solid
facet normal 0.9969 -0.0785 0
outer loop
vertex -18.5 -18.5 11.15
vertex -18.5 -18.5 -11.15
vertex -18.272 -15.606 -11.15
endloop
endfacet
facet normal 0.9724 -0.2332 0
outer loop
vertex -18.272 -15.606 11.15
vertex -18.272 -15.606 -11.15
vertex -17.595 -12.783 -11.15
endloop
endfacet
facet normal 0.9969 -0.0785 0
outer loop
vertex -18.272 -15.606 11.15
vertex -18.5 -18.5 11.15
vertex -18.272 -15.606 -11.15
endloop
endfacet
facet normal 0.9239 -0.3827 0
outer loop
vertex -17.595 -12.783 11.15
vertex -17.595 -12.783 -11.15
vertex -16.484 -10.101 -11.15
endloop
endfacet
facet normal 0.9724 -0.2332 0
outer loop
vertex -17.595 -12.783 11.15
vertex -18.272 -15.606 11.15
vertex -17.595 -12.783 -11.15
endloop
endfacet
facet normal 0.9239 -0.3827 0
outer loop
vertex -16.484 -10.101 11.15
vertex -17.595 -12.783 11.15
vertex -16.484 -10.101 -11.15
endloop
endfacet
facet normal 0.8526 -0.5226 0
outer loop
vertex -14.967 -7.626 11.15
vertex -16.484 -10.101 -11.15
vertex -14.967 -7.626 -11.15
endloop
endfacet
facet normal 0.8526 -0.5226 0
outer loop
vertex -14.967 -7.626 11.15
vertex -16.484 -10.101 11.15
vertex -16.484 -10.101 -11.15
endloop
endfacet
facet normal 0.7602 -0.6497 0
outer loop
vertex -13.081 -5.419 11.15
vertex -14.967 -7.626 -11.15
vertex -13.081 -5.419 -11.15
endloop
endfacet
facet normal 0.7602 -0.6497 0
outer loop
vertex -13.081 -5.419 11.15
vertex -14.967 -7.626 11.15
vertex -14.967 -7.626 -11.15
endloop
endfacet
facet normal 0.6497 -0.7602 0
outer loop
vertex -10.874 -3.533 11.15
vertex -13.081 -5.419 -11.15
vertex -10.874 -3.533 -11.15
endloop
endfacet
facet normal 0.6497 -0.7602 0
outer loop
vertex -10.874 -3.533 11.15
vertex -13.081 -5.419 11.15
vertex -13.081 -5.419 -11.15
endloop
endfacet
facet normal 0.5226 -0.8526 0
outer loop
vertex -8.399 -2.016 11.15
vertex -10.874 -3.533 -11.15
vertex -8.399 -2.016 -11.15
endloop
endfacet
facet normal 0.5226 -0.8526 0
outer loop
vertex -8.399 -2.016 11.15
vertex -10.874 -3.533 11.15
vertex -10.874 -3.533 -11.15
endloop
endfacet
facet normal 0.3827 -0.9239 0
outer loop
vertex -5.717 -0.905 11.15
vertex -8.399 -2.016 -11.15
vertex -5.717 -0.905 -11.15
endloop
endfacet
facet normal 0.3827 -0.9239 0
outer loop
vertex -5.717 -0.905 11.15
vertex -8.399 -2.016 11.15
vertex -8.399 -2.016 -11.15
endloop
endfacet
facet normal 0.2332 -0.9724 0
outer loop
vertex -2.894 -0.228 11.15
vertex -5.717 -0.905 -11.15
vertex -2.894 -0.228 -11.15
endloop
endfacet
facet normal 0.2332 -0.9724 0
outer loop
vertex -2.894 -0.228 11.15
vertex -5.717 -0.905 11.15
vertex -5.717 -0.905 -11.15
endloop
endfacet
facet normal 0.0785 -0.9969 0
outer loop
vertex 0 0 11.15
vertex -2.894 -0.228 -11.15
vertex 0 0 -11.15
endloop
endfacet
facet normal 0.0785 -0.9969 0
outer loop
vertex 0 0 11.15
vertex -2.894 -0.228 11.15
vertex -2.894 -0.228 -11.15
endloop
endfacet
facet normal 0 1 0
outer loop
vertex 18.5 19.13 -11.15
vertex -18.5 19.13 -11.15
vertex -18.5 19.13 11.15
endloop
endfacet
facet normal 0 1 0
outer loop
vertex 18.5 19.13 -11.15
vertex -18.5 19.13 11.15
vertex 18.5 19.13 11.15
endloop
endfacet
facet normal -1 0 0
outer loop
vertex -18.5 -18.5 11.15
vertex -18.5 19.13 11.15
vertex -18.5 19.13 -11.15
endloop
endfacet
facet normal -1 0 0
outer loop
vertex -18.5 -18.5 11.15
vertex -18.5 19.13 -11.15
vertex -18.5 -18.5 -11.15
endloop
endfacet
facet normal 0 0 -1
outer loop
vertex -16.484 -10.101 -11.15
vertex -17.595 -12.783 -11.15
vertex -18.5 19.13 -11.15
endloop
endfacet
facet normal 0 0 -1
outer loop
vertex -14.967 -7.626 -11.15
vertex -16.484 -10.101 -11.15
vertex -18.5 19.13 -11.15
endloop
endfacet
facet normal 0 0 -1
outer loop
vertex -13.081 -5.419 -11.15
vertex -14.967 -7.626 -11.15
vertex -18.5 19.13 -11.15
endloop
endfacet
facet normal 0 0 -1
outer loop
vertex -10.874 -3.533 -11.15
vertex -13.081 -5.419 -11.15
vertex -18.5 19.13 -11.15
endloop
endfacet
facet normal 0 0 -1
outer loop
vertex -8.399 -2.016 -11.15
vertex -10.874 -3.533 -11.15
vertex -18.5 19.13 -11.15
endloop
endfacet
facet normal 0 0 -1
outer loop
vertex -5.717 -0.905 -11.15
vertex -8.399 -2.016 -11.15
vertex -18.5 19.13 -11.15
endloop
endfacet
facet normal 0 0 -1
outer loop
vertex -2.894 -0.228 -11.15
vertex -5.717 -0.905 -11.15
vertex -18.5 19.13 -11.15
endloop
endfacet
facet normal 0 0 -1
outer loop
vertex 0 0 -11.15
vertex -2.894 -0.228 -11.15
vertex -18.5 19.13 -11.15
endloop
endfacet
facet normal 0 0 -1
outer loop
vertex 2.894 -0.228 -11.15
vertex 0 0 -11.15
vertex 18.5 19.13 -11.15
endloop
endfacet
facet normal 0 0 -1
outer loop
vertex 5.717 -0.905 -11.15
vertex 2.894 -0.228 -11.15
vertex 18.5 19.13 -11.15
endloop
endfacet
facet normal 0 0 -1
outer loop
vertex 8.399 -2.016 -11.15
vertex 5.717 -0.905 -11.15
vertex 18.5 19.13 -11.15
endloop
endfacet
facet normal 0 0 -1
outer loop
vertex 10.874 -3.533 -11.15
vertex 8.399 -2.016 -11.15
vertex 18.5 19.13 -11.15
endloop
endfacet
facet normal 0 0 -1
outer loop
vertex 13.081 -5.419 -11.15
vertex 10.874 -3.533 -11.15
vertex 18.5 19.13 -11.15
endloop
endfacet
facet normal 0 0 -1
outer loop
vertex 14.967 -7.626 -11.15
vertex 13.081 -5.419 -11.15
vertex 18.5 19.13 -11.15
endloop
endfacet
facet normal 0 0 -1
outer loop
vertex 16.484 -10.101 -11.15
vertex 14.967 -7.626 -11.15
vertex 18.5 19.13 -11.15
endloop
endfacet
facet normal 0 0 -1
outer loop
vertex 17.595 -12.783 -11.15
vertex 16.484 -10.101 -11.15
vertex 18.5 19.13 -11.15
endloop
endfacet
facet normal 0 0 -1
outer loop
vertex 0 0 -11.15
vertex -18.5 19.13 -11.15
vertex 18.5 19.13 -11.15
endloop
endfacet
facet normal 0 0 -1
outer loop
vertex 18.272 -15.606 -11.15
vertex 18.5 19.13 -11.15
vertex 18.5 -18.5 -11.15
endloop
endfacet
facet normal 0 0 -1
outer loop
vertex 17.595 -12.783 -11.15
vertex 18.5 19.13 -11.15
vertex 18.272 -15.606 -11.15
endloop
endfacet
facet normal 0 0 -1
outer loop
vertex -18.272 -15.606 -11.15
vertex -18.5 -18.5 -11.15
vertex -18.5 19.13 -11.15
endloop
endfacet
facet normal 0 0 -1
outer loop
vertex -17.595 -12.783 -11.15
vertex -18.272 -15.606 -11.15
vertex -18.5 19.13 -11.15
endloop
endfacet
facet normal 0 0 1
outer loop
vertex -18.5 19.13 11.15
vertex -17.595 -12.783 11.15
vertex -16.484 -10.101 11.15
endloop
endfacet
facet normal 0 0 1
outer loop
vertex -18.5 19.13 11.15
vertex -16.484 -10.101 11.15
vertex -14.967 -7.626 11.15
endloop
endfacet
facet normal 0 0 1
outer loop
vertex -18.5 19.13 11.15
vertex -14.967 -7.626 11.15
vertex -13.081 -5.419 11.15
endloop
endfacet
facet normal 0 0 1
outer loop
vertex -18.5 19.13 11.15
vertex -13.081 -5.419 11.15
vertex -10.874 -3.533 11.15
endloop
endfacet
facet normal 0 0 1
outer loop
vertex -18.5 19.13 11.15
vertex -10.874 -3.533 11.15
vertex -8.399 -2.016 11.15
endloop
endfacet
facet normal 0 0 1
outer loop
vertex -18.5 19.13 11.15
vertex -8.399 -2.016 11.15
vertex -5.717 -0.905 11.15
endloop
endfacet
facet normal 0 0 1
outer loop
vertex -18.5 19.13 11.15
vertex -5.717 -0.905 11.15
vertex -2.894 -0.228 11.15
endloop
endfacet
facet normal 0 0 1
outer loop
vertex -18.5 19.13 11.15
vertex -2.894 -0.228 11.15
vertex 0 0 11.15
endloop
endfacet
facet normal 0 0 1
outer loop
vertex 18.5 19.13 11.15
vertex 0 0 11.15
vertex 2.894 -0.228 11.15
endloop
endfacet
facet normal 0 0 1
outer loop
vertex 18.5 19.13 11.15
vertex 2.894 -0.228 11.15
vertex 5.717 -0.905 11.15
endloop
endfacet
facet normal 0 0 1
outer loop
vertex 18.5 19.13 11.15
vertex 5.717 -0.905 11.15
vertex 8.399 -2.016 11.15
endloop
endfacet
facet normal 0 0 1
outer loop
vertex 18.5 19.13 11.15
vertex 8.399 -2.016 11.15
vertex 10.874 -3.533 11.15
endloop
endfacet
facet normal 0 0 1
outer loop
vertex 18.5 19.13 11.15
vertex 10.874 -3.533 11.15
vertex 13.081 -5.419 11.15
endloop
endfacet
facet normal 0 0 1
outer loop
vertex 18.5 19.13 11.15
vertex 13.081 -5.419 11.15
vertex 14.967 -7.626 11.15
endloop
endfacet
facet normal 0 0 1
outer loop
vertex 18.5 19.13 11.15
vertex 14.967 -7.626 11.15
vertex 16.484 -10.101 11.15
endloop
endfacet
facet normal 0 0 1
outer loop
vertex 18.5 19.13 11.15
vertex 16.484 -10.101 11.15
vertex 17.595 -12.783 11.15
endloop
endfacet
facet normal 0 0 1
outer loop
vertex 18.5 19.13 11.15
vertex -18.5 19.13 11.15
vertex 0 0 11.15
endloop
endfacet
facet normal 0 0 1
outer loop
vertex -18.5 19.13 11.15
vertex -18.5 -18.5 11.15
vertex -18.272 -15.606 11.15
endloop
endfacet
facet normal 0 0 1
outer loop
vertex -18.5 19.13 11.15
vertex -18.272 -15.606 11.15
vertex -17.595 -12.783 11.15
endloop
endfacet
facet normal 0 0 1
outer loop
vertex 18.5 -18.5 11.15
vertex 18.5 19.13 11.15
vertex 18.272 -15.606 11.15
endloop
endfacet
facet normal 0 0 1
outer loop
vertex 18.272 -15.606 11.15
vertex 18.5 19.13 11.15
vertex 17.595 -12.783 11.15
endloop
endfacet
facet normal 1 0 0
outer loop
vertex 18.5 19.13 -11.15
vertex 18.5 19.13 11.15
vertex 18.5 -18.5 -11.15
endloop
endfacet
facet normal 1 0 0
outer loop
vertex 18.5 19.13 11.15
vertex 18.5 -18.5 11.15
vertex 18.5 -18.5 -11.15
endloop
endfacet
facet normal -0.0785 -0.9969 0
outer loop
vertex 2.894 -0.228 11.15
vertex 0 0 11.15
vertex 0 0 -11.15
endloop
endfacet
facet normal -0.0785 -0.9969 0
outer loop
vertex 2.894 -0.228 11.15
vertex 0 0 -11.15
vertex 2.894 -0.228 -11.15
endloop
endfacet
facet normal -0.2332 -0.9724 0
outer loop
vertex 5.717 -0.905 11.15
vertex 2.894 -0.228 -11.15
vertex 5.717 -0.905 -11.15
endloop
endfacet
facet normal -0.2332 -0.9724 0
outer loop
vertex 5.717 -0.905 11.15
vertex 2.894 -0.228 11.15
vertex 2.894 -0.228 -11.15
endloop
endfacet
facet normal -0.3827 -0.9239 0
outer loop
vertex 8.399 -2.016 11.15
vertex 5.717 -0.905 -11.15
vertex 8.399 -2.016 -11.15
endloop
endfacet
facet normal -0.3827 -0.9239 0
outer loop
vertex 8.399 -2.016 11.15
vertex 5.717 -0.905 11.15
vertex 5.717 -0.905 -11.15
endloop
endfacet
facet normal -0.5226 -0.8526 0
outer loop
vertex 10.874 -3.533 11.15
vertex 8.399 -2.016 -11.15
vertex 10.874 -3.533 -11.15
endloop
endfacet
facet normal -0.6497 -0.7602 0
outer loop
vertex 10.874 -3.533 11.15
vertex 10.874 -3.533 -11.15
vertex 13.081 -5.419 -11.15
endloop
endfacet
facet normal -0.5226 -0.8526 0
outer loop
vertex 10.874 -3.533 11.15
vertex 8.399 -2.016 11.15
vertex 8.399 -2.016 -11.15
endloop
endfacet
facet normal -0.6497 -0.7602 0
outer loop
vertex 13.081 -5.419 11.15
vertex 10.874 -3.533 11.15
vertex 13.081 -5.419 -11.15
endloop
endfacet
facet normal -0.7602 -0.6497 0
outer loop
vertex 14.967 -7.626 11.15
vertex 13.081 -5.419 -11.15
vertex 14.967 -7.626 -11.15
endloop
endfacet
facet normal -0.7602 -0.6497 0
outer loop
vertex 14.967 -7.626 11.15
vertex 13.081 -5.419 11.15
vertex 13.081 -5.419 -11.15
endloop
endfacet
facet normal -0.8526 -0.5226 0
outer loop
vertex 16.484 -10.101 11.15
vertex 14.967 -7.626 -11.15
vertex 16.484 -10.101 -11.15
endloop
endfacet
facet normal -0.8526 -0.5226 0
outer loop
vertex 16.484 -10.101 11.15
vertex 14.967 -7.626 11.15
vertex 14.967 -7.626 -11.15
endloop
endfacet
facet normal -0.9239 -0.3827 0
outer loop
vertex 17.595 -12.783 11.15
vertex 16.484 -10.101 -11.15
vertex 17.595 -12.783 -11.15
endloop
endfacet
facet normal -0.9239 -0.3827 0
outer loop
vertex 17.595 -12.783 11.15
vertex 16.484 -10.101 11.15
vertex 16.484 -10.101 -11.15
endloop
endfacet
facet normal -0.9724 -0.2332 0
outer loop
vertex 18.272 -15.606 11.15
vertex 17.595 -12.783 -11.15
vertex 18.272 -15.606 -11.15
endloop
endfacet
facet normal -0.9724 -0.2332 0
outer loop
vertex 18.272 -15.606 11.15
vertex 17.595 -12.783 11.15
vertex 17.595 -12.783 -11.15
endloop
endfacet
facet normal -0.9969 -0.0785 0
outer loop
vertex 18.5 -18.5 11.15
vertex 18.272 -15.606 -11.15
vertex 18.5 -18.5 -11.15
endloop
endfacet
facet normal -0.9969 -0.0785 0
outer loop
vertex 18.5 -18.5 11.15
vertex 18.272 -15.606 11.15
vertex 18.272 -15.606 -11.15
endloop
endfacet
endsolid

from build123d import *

# Parameters (mm, degrees)
SKETCH1_W           = 37
SKETCH1_H           = 22.3
BOSS_EXTRUDE1_DEPTH = 19.13
BOSS_EXTRUDE2_DEPTH = 22.3


with BuildPart() as part:
    # Sketch1 → Boss-Extrude1 (new body)
    with BuildSketch(Plane(origin=(0, 0, 0), x_dir=(1, 0, 0), z_dir=(0, 1, 0))):
        Rectangle(SKETCH1_W, SKETCH1_H)
    extrude(amount=BOSS_EXTRUDE1_DEPTH)

    # Sketch2 → Boss-Extrude2 (add)
    with BuildSketch(Plane.XY.offset(11.15)):
        with BuildLine():
            Line((4e-09, 0), (-18.5, 0))
            Line((-18.5, 0), (-18.5, -18.5))
            ThreePointArc((-18.5, -18.5), (-13.081475451, -5.418524547), (4e-09, 0))
        make_face()
        with BuildLine():
            Line((18.5, 0), (4e-09, 0))
            ThreePointArc((4e-09, 0), (13.081475453, -5.418524549), (18.5, -18.5))
            Line((18.5, -18.5), (18.5, 0))
        make_face()
    extrude(amount=-BOSS_EXTRUDE2_DEPTH)


solid = part.part
